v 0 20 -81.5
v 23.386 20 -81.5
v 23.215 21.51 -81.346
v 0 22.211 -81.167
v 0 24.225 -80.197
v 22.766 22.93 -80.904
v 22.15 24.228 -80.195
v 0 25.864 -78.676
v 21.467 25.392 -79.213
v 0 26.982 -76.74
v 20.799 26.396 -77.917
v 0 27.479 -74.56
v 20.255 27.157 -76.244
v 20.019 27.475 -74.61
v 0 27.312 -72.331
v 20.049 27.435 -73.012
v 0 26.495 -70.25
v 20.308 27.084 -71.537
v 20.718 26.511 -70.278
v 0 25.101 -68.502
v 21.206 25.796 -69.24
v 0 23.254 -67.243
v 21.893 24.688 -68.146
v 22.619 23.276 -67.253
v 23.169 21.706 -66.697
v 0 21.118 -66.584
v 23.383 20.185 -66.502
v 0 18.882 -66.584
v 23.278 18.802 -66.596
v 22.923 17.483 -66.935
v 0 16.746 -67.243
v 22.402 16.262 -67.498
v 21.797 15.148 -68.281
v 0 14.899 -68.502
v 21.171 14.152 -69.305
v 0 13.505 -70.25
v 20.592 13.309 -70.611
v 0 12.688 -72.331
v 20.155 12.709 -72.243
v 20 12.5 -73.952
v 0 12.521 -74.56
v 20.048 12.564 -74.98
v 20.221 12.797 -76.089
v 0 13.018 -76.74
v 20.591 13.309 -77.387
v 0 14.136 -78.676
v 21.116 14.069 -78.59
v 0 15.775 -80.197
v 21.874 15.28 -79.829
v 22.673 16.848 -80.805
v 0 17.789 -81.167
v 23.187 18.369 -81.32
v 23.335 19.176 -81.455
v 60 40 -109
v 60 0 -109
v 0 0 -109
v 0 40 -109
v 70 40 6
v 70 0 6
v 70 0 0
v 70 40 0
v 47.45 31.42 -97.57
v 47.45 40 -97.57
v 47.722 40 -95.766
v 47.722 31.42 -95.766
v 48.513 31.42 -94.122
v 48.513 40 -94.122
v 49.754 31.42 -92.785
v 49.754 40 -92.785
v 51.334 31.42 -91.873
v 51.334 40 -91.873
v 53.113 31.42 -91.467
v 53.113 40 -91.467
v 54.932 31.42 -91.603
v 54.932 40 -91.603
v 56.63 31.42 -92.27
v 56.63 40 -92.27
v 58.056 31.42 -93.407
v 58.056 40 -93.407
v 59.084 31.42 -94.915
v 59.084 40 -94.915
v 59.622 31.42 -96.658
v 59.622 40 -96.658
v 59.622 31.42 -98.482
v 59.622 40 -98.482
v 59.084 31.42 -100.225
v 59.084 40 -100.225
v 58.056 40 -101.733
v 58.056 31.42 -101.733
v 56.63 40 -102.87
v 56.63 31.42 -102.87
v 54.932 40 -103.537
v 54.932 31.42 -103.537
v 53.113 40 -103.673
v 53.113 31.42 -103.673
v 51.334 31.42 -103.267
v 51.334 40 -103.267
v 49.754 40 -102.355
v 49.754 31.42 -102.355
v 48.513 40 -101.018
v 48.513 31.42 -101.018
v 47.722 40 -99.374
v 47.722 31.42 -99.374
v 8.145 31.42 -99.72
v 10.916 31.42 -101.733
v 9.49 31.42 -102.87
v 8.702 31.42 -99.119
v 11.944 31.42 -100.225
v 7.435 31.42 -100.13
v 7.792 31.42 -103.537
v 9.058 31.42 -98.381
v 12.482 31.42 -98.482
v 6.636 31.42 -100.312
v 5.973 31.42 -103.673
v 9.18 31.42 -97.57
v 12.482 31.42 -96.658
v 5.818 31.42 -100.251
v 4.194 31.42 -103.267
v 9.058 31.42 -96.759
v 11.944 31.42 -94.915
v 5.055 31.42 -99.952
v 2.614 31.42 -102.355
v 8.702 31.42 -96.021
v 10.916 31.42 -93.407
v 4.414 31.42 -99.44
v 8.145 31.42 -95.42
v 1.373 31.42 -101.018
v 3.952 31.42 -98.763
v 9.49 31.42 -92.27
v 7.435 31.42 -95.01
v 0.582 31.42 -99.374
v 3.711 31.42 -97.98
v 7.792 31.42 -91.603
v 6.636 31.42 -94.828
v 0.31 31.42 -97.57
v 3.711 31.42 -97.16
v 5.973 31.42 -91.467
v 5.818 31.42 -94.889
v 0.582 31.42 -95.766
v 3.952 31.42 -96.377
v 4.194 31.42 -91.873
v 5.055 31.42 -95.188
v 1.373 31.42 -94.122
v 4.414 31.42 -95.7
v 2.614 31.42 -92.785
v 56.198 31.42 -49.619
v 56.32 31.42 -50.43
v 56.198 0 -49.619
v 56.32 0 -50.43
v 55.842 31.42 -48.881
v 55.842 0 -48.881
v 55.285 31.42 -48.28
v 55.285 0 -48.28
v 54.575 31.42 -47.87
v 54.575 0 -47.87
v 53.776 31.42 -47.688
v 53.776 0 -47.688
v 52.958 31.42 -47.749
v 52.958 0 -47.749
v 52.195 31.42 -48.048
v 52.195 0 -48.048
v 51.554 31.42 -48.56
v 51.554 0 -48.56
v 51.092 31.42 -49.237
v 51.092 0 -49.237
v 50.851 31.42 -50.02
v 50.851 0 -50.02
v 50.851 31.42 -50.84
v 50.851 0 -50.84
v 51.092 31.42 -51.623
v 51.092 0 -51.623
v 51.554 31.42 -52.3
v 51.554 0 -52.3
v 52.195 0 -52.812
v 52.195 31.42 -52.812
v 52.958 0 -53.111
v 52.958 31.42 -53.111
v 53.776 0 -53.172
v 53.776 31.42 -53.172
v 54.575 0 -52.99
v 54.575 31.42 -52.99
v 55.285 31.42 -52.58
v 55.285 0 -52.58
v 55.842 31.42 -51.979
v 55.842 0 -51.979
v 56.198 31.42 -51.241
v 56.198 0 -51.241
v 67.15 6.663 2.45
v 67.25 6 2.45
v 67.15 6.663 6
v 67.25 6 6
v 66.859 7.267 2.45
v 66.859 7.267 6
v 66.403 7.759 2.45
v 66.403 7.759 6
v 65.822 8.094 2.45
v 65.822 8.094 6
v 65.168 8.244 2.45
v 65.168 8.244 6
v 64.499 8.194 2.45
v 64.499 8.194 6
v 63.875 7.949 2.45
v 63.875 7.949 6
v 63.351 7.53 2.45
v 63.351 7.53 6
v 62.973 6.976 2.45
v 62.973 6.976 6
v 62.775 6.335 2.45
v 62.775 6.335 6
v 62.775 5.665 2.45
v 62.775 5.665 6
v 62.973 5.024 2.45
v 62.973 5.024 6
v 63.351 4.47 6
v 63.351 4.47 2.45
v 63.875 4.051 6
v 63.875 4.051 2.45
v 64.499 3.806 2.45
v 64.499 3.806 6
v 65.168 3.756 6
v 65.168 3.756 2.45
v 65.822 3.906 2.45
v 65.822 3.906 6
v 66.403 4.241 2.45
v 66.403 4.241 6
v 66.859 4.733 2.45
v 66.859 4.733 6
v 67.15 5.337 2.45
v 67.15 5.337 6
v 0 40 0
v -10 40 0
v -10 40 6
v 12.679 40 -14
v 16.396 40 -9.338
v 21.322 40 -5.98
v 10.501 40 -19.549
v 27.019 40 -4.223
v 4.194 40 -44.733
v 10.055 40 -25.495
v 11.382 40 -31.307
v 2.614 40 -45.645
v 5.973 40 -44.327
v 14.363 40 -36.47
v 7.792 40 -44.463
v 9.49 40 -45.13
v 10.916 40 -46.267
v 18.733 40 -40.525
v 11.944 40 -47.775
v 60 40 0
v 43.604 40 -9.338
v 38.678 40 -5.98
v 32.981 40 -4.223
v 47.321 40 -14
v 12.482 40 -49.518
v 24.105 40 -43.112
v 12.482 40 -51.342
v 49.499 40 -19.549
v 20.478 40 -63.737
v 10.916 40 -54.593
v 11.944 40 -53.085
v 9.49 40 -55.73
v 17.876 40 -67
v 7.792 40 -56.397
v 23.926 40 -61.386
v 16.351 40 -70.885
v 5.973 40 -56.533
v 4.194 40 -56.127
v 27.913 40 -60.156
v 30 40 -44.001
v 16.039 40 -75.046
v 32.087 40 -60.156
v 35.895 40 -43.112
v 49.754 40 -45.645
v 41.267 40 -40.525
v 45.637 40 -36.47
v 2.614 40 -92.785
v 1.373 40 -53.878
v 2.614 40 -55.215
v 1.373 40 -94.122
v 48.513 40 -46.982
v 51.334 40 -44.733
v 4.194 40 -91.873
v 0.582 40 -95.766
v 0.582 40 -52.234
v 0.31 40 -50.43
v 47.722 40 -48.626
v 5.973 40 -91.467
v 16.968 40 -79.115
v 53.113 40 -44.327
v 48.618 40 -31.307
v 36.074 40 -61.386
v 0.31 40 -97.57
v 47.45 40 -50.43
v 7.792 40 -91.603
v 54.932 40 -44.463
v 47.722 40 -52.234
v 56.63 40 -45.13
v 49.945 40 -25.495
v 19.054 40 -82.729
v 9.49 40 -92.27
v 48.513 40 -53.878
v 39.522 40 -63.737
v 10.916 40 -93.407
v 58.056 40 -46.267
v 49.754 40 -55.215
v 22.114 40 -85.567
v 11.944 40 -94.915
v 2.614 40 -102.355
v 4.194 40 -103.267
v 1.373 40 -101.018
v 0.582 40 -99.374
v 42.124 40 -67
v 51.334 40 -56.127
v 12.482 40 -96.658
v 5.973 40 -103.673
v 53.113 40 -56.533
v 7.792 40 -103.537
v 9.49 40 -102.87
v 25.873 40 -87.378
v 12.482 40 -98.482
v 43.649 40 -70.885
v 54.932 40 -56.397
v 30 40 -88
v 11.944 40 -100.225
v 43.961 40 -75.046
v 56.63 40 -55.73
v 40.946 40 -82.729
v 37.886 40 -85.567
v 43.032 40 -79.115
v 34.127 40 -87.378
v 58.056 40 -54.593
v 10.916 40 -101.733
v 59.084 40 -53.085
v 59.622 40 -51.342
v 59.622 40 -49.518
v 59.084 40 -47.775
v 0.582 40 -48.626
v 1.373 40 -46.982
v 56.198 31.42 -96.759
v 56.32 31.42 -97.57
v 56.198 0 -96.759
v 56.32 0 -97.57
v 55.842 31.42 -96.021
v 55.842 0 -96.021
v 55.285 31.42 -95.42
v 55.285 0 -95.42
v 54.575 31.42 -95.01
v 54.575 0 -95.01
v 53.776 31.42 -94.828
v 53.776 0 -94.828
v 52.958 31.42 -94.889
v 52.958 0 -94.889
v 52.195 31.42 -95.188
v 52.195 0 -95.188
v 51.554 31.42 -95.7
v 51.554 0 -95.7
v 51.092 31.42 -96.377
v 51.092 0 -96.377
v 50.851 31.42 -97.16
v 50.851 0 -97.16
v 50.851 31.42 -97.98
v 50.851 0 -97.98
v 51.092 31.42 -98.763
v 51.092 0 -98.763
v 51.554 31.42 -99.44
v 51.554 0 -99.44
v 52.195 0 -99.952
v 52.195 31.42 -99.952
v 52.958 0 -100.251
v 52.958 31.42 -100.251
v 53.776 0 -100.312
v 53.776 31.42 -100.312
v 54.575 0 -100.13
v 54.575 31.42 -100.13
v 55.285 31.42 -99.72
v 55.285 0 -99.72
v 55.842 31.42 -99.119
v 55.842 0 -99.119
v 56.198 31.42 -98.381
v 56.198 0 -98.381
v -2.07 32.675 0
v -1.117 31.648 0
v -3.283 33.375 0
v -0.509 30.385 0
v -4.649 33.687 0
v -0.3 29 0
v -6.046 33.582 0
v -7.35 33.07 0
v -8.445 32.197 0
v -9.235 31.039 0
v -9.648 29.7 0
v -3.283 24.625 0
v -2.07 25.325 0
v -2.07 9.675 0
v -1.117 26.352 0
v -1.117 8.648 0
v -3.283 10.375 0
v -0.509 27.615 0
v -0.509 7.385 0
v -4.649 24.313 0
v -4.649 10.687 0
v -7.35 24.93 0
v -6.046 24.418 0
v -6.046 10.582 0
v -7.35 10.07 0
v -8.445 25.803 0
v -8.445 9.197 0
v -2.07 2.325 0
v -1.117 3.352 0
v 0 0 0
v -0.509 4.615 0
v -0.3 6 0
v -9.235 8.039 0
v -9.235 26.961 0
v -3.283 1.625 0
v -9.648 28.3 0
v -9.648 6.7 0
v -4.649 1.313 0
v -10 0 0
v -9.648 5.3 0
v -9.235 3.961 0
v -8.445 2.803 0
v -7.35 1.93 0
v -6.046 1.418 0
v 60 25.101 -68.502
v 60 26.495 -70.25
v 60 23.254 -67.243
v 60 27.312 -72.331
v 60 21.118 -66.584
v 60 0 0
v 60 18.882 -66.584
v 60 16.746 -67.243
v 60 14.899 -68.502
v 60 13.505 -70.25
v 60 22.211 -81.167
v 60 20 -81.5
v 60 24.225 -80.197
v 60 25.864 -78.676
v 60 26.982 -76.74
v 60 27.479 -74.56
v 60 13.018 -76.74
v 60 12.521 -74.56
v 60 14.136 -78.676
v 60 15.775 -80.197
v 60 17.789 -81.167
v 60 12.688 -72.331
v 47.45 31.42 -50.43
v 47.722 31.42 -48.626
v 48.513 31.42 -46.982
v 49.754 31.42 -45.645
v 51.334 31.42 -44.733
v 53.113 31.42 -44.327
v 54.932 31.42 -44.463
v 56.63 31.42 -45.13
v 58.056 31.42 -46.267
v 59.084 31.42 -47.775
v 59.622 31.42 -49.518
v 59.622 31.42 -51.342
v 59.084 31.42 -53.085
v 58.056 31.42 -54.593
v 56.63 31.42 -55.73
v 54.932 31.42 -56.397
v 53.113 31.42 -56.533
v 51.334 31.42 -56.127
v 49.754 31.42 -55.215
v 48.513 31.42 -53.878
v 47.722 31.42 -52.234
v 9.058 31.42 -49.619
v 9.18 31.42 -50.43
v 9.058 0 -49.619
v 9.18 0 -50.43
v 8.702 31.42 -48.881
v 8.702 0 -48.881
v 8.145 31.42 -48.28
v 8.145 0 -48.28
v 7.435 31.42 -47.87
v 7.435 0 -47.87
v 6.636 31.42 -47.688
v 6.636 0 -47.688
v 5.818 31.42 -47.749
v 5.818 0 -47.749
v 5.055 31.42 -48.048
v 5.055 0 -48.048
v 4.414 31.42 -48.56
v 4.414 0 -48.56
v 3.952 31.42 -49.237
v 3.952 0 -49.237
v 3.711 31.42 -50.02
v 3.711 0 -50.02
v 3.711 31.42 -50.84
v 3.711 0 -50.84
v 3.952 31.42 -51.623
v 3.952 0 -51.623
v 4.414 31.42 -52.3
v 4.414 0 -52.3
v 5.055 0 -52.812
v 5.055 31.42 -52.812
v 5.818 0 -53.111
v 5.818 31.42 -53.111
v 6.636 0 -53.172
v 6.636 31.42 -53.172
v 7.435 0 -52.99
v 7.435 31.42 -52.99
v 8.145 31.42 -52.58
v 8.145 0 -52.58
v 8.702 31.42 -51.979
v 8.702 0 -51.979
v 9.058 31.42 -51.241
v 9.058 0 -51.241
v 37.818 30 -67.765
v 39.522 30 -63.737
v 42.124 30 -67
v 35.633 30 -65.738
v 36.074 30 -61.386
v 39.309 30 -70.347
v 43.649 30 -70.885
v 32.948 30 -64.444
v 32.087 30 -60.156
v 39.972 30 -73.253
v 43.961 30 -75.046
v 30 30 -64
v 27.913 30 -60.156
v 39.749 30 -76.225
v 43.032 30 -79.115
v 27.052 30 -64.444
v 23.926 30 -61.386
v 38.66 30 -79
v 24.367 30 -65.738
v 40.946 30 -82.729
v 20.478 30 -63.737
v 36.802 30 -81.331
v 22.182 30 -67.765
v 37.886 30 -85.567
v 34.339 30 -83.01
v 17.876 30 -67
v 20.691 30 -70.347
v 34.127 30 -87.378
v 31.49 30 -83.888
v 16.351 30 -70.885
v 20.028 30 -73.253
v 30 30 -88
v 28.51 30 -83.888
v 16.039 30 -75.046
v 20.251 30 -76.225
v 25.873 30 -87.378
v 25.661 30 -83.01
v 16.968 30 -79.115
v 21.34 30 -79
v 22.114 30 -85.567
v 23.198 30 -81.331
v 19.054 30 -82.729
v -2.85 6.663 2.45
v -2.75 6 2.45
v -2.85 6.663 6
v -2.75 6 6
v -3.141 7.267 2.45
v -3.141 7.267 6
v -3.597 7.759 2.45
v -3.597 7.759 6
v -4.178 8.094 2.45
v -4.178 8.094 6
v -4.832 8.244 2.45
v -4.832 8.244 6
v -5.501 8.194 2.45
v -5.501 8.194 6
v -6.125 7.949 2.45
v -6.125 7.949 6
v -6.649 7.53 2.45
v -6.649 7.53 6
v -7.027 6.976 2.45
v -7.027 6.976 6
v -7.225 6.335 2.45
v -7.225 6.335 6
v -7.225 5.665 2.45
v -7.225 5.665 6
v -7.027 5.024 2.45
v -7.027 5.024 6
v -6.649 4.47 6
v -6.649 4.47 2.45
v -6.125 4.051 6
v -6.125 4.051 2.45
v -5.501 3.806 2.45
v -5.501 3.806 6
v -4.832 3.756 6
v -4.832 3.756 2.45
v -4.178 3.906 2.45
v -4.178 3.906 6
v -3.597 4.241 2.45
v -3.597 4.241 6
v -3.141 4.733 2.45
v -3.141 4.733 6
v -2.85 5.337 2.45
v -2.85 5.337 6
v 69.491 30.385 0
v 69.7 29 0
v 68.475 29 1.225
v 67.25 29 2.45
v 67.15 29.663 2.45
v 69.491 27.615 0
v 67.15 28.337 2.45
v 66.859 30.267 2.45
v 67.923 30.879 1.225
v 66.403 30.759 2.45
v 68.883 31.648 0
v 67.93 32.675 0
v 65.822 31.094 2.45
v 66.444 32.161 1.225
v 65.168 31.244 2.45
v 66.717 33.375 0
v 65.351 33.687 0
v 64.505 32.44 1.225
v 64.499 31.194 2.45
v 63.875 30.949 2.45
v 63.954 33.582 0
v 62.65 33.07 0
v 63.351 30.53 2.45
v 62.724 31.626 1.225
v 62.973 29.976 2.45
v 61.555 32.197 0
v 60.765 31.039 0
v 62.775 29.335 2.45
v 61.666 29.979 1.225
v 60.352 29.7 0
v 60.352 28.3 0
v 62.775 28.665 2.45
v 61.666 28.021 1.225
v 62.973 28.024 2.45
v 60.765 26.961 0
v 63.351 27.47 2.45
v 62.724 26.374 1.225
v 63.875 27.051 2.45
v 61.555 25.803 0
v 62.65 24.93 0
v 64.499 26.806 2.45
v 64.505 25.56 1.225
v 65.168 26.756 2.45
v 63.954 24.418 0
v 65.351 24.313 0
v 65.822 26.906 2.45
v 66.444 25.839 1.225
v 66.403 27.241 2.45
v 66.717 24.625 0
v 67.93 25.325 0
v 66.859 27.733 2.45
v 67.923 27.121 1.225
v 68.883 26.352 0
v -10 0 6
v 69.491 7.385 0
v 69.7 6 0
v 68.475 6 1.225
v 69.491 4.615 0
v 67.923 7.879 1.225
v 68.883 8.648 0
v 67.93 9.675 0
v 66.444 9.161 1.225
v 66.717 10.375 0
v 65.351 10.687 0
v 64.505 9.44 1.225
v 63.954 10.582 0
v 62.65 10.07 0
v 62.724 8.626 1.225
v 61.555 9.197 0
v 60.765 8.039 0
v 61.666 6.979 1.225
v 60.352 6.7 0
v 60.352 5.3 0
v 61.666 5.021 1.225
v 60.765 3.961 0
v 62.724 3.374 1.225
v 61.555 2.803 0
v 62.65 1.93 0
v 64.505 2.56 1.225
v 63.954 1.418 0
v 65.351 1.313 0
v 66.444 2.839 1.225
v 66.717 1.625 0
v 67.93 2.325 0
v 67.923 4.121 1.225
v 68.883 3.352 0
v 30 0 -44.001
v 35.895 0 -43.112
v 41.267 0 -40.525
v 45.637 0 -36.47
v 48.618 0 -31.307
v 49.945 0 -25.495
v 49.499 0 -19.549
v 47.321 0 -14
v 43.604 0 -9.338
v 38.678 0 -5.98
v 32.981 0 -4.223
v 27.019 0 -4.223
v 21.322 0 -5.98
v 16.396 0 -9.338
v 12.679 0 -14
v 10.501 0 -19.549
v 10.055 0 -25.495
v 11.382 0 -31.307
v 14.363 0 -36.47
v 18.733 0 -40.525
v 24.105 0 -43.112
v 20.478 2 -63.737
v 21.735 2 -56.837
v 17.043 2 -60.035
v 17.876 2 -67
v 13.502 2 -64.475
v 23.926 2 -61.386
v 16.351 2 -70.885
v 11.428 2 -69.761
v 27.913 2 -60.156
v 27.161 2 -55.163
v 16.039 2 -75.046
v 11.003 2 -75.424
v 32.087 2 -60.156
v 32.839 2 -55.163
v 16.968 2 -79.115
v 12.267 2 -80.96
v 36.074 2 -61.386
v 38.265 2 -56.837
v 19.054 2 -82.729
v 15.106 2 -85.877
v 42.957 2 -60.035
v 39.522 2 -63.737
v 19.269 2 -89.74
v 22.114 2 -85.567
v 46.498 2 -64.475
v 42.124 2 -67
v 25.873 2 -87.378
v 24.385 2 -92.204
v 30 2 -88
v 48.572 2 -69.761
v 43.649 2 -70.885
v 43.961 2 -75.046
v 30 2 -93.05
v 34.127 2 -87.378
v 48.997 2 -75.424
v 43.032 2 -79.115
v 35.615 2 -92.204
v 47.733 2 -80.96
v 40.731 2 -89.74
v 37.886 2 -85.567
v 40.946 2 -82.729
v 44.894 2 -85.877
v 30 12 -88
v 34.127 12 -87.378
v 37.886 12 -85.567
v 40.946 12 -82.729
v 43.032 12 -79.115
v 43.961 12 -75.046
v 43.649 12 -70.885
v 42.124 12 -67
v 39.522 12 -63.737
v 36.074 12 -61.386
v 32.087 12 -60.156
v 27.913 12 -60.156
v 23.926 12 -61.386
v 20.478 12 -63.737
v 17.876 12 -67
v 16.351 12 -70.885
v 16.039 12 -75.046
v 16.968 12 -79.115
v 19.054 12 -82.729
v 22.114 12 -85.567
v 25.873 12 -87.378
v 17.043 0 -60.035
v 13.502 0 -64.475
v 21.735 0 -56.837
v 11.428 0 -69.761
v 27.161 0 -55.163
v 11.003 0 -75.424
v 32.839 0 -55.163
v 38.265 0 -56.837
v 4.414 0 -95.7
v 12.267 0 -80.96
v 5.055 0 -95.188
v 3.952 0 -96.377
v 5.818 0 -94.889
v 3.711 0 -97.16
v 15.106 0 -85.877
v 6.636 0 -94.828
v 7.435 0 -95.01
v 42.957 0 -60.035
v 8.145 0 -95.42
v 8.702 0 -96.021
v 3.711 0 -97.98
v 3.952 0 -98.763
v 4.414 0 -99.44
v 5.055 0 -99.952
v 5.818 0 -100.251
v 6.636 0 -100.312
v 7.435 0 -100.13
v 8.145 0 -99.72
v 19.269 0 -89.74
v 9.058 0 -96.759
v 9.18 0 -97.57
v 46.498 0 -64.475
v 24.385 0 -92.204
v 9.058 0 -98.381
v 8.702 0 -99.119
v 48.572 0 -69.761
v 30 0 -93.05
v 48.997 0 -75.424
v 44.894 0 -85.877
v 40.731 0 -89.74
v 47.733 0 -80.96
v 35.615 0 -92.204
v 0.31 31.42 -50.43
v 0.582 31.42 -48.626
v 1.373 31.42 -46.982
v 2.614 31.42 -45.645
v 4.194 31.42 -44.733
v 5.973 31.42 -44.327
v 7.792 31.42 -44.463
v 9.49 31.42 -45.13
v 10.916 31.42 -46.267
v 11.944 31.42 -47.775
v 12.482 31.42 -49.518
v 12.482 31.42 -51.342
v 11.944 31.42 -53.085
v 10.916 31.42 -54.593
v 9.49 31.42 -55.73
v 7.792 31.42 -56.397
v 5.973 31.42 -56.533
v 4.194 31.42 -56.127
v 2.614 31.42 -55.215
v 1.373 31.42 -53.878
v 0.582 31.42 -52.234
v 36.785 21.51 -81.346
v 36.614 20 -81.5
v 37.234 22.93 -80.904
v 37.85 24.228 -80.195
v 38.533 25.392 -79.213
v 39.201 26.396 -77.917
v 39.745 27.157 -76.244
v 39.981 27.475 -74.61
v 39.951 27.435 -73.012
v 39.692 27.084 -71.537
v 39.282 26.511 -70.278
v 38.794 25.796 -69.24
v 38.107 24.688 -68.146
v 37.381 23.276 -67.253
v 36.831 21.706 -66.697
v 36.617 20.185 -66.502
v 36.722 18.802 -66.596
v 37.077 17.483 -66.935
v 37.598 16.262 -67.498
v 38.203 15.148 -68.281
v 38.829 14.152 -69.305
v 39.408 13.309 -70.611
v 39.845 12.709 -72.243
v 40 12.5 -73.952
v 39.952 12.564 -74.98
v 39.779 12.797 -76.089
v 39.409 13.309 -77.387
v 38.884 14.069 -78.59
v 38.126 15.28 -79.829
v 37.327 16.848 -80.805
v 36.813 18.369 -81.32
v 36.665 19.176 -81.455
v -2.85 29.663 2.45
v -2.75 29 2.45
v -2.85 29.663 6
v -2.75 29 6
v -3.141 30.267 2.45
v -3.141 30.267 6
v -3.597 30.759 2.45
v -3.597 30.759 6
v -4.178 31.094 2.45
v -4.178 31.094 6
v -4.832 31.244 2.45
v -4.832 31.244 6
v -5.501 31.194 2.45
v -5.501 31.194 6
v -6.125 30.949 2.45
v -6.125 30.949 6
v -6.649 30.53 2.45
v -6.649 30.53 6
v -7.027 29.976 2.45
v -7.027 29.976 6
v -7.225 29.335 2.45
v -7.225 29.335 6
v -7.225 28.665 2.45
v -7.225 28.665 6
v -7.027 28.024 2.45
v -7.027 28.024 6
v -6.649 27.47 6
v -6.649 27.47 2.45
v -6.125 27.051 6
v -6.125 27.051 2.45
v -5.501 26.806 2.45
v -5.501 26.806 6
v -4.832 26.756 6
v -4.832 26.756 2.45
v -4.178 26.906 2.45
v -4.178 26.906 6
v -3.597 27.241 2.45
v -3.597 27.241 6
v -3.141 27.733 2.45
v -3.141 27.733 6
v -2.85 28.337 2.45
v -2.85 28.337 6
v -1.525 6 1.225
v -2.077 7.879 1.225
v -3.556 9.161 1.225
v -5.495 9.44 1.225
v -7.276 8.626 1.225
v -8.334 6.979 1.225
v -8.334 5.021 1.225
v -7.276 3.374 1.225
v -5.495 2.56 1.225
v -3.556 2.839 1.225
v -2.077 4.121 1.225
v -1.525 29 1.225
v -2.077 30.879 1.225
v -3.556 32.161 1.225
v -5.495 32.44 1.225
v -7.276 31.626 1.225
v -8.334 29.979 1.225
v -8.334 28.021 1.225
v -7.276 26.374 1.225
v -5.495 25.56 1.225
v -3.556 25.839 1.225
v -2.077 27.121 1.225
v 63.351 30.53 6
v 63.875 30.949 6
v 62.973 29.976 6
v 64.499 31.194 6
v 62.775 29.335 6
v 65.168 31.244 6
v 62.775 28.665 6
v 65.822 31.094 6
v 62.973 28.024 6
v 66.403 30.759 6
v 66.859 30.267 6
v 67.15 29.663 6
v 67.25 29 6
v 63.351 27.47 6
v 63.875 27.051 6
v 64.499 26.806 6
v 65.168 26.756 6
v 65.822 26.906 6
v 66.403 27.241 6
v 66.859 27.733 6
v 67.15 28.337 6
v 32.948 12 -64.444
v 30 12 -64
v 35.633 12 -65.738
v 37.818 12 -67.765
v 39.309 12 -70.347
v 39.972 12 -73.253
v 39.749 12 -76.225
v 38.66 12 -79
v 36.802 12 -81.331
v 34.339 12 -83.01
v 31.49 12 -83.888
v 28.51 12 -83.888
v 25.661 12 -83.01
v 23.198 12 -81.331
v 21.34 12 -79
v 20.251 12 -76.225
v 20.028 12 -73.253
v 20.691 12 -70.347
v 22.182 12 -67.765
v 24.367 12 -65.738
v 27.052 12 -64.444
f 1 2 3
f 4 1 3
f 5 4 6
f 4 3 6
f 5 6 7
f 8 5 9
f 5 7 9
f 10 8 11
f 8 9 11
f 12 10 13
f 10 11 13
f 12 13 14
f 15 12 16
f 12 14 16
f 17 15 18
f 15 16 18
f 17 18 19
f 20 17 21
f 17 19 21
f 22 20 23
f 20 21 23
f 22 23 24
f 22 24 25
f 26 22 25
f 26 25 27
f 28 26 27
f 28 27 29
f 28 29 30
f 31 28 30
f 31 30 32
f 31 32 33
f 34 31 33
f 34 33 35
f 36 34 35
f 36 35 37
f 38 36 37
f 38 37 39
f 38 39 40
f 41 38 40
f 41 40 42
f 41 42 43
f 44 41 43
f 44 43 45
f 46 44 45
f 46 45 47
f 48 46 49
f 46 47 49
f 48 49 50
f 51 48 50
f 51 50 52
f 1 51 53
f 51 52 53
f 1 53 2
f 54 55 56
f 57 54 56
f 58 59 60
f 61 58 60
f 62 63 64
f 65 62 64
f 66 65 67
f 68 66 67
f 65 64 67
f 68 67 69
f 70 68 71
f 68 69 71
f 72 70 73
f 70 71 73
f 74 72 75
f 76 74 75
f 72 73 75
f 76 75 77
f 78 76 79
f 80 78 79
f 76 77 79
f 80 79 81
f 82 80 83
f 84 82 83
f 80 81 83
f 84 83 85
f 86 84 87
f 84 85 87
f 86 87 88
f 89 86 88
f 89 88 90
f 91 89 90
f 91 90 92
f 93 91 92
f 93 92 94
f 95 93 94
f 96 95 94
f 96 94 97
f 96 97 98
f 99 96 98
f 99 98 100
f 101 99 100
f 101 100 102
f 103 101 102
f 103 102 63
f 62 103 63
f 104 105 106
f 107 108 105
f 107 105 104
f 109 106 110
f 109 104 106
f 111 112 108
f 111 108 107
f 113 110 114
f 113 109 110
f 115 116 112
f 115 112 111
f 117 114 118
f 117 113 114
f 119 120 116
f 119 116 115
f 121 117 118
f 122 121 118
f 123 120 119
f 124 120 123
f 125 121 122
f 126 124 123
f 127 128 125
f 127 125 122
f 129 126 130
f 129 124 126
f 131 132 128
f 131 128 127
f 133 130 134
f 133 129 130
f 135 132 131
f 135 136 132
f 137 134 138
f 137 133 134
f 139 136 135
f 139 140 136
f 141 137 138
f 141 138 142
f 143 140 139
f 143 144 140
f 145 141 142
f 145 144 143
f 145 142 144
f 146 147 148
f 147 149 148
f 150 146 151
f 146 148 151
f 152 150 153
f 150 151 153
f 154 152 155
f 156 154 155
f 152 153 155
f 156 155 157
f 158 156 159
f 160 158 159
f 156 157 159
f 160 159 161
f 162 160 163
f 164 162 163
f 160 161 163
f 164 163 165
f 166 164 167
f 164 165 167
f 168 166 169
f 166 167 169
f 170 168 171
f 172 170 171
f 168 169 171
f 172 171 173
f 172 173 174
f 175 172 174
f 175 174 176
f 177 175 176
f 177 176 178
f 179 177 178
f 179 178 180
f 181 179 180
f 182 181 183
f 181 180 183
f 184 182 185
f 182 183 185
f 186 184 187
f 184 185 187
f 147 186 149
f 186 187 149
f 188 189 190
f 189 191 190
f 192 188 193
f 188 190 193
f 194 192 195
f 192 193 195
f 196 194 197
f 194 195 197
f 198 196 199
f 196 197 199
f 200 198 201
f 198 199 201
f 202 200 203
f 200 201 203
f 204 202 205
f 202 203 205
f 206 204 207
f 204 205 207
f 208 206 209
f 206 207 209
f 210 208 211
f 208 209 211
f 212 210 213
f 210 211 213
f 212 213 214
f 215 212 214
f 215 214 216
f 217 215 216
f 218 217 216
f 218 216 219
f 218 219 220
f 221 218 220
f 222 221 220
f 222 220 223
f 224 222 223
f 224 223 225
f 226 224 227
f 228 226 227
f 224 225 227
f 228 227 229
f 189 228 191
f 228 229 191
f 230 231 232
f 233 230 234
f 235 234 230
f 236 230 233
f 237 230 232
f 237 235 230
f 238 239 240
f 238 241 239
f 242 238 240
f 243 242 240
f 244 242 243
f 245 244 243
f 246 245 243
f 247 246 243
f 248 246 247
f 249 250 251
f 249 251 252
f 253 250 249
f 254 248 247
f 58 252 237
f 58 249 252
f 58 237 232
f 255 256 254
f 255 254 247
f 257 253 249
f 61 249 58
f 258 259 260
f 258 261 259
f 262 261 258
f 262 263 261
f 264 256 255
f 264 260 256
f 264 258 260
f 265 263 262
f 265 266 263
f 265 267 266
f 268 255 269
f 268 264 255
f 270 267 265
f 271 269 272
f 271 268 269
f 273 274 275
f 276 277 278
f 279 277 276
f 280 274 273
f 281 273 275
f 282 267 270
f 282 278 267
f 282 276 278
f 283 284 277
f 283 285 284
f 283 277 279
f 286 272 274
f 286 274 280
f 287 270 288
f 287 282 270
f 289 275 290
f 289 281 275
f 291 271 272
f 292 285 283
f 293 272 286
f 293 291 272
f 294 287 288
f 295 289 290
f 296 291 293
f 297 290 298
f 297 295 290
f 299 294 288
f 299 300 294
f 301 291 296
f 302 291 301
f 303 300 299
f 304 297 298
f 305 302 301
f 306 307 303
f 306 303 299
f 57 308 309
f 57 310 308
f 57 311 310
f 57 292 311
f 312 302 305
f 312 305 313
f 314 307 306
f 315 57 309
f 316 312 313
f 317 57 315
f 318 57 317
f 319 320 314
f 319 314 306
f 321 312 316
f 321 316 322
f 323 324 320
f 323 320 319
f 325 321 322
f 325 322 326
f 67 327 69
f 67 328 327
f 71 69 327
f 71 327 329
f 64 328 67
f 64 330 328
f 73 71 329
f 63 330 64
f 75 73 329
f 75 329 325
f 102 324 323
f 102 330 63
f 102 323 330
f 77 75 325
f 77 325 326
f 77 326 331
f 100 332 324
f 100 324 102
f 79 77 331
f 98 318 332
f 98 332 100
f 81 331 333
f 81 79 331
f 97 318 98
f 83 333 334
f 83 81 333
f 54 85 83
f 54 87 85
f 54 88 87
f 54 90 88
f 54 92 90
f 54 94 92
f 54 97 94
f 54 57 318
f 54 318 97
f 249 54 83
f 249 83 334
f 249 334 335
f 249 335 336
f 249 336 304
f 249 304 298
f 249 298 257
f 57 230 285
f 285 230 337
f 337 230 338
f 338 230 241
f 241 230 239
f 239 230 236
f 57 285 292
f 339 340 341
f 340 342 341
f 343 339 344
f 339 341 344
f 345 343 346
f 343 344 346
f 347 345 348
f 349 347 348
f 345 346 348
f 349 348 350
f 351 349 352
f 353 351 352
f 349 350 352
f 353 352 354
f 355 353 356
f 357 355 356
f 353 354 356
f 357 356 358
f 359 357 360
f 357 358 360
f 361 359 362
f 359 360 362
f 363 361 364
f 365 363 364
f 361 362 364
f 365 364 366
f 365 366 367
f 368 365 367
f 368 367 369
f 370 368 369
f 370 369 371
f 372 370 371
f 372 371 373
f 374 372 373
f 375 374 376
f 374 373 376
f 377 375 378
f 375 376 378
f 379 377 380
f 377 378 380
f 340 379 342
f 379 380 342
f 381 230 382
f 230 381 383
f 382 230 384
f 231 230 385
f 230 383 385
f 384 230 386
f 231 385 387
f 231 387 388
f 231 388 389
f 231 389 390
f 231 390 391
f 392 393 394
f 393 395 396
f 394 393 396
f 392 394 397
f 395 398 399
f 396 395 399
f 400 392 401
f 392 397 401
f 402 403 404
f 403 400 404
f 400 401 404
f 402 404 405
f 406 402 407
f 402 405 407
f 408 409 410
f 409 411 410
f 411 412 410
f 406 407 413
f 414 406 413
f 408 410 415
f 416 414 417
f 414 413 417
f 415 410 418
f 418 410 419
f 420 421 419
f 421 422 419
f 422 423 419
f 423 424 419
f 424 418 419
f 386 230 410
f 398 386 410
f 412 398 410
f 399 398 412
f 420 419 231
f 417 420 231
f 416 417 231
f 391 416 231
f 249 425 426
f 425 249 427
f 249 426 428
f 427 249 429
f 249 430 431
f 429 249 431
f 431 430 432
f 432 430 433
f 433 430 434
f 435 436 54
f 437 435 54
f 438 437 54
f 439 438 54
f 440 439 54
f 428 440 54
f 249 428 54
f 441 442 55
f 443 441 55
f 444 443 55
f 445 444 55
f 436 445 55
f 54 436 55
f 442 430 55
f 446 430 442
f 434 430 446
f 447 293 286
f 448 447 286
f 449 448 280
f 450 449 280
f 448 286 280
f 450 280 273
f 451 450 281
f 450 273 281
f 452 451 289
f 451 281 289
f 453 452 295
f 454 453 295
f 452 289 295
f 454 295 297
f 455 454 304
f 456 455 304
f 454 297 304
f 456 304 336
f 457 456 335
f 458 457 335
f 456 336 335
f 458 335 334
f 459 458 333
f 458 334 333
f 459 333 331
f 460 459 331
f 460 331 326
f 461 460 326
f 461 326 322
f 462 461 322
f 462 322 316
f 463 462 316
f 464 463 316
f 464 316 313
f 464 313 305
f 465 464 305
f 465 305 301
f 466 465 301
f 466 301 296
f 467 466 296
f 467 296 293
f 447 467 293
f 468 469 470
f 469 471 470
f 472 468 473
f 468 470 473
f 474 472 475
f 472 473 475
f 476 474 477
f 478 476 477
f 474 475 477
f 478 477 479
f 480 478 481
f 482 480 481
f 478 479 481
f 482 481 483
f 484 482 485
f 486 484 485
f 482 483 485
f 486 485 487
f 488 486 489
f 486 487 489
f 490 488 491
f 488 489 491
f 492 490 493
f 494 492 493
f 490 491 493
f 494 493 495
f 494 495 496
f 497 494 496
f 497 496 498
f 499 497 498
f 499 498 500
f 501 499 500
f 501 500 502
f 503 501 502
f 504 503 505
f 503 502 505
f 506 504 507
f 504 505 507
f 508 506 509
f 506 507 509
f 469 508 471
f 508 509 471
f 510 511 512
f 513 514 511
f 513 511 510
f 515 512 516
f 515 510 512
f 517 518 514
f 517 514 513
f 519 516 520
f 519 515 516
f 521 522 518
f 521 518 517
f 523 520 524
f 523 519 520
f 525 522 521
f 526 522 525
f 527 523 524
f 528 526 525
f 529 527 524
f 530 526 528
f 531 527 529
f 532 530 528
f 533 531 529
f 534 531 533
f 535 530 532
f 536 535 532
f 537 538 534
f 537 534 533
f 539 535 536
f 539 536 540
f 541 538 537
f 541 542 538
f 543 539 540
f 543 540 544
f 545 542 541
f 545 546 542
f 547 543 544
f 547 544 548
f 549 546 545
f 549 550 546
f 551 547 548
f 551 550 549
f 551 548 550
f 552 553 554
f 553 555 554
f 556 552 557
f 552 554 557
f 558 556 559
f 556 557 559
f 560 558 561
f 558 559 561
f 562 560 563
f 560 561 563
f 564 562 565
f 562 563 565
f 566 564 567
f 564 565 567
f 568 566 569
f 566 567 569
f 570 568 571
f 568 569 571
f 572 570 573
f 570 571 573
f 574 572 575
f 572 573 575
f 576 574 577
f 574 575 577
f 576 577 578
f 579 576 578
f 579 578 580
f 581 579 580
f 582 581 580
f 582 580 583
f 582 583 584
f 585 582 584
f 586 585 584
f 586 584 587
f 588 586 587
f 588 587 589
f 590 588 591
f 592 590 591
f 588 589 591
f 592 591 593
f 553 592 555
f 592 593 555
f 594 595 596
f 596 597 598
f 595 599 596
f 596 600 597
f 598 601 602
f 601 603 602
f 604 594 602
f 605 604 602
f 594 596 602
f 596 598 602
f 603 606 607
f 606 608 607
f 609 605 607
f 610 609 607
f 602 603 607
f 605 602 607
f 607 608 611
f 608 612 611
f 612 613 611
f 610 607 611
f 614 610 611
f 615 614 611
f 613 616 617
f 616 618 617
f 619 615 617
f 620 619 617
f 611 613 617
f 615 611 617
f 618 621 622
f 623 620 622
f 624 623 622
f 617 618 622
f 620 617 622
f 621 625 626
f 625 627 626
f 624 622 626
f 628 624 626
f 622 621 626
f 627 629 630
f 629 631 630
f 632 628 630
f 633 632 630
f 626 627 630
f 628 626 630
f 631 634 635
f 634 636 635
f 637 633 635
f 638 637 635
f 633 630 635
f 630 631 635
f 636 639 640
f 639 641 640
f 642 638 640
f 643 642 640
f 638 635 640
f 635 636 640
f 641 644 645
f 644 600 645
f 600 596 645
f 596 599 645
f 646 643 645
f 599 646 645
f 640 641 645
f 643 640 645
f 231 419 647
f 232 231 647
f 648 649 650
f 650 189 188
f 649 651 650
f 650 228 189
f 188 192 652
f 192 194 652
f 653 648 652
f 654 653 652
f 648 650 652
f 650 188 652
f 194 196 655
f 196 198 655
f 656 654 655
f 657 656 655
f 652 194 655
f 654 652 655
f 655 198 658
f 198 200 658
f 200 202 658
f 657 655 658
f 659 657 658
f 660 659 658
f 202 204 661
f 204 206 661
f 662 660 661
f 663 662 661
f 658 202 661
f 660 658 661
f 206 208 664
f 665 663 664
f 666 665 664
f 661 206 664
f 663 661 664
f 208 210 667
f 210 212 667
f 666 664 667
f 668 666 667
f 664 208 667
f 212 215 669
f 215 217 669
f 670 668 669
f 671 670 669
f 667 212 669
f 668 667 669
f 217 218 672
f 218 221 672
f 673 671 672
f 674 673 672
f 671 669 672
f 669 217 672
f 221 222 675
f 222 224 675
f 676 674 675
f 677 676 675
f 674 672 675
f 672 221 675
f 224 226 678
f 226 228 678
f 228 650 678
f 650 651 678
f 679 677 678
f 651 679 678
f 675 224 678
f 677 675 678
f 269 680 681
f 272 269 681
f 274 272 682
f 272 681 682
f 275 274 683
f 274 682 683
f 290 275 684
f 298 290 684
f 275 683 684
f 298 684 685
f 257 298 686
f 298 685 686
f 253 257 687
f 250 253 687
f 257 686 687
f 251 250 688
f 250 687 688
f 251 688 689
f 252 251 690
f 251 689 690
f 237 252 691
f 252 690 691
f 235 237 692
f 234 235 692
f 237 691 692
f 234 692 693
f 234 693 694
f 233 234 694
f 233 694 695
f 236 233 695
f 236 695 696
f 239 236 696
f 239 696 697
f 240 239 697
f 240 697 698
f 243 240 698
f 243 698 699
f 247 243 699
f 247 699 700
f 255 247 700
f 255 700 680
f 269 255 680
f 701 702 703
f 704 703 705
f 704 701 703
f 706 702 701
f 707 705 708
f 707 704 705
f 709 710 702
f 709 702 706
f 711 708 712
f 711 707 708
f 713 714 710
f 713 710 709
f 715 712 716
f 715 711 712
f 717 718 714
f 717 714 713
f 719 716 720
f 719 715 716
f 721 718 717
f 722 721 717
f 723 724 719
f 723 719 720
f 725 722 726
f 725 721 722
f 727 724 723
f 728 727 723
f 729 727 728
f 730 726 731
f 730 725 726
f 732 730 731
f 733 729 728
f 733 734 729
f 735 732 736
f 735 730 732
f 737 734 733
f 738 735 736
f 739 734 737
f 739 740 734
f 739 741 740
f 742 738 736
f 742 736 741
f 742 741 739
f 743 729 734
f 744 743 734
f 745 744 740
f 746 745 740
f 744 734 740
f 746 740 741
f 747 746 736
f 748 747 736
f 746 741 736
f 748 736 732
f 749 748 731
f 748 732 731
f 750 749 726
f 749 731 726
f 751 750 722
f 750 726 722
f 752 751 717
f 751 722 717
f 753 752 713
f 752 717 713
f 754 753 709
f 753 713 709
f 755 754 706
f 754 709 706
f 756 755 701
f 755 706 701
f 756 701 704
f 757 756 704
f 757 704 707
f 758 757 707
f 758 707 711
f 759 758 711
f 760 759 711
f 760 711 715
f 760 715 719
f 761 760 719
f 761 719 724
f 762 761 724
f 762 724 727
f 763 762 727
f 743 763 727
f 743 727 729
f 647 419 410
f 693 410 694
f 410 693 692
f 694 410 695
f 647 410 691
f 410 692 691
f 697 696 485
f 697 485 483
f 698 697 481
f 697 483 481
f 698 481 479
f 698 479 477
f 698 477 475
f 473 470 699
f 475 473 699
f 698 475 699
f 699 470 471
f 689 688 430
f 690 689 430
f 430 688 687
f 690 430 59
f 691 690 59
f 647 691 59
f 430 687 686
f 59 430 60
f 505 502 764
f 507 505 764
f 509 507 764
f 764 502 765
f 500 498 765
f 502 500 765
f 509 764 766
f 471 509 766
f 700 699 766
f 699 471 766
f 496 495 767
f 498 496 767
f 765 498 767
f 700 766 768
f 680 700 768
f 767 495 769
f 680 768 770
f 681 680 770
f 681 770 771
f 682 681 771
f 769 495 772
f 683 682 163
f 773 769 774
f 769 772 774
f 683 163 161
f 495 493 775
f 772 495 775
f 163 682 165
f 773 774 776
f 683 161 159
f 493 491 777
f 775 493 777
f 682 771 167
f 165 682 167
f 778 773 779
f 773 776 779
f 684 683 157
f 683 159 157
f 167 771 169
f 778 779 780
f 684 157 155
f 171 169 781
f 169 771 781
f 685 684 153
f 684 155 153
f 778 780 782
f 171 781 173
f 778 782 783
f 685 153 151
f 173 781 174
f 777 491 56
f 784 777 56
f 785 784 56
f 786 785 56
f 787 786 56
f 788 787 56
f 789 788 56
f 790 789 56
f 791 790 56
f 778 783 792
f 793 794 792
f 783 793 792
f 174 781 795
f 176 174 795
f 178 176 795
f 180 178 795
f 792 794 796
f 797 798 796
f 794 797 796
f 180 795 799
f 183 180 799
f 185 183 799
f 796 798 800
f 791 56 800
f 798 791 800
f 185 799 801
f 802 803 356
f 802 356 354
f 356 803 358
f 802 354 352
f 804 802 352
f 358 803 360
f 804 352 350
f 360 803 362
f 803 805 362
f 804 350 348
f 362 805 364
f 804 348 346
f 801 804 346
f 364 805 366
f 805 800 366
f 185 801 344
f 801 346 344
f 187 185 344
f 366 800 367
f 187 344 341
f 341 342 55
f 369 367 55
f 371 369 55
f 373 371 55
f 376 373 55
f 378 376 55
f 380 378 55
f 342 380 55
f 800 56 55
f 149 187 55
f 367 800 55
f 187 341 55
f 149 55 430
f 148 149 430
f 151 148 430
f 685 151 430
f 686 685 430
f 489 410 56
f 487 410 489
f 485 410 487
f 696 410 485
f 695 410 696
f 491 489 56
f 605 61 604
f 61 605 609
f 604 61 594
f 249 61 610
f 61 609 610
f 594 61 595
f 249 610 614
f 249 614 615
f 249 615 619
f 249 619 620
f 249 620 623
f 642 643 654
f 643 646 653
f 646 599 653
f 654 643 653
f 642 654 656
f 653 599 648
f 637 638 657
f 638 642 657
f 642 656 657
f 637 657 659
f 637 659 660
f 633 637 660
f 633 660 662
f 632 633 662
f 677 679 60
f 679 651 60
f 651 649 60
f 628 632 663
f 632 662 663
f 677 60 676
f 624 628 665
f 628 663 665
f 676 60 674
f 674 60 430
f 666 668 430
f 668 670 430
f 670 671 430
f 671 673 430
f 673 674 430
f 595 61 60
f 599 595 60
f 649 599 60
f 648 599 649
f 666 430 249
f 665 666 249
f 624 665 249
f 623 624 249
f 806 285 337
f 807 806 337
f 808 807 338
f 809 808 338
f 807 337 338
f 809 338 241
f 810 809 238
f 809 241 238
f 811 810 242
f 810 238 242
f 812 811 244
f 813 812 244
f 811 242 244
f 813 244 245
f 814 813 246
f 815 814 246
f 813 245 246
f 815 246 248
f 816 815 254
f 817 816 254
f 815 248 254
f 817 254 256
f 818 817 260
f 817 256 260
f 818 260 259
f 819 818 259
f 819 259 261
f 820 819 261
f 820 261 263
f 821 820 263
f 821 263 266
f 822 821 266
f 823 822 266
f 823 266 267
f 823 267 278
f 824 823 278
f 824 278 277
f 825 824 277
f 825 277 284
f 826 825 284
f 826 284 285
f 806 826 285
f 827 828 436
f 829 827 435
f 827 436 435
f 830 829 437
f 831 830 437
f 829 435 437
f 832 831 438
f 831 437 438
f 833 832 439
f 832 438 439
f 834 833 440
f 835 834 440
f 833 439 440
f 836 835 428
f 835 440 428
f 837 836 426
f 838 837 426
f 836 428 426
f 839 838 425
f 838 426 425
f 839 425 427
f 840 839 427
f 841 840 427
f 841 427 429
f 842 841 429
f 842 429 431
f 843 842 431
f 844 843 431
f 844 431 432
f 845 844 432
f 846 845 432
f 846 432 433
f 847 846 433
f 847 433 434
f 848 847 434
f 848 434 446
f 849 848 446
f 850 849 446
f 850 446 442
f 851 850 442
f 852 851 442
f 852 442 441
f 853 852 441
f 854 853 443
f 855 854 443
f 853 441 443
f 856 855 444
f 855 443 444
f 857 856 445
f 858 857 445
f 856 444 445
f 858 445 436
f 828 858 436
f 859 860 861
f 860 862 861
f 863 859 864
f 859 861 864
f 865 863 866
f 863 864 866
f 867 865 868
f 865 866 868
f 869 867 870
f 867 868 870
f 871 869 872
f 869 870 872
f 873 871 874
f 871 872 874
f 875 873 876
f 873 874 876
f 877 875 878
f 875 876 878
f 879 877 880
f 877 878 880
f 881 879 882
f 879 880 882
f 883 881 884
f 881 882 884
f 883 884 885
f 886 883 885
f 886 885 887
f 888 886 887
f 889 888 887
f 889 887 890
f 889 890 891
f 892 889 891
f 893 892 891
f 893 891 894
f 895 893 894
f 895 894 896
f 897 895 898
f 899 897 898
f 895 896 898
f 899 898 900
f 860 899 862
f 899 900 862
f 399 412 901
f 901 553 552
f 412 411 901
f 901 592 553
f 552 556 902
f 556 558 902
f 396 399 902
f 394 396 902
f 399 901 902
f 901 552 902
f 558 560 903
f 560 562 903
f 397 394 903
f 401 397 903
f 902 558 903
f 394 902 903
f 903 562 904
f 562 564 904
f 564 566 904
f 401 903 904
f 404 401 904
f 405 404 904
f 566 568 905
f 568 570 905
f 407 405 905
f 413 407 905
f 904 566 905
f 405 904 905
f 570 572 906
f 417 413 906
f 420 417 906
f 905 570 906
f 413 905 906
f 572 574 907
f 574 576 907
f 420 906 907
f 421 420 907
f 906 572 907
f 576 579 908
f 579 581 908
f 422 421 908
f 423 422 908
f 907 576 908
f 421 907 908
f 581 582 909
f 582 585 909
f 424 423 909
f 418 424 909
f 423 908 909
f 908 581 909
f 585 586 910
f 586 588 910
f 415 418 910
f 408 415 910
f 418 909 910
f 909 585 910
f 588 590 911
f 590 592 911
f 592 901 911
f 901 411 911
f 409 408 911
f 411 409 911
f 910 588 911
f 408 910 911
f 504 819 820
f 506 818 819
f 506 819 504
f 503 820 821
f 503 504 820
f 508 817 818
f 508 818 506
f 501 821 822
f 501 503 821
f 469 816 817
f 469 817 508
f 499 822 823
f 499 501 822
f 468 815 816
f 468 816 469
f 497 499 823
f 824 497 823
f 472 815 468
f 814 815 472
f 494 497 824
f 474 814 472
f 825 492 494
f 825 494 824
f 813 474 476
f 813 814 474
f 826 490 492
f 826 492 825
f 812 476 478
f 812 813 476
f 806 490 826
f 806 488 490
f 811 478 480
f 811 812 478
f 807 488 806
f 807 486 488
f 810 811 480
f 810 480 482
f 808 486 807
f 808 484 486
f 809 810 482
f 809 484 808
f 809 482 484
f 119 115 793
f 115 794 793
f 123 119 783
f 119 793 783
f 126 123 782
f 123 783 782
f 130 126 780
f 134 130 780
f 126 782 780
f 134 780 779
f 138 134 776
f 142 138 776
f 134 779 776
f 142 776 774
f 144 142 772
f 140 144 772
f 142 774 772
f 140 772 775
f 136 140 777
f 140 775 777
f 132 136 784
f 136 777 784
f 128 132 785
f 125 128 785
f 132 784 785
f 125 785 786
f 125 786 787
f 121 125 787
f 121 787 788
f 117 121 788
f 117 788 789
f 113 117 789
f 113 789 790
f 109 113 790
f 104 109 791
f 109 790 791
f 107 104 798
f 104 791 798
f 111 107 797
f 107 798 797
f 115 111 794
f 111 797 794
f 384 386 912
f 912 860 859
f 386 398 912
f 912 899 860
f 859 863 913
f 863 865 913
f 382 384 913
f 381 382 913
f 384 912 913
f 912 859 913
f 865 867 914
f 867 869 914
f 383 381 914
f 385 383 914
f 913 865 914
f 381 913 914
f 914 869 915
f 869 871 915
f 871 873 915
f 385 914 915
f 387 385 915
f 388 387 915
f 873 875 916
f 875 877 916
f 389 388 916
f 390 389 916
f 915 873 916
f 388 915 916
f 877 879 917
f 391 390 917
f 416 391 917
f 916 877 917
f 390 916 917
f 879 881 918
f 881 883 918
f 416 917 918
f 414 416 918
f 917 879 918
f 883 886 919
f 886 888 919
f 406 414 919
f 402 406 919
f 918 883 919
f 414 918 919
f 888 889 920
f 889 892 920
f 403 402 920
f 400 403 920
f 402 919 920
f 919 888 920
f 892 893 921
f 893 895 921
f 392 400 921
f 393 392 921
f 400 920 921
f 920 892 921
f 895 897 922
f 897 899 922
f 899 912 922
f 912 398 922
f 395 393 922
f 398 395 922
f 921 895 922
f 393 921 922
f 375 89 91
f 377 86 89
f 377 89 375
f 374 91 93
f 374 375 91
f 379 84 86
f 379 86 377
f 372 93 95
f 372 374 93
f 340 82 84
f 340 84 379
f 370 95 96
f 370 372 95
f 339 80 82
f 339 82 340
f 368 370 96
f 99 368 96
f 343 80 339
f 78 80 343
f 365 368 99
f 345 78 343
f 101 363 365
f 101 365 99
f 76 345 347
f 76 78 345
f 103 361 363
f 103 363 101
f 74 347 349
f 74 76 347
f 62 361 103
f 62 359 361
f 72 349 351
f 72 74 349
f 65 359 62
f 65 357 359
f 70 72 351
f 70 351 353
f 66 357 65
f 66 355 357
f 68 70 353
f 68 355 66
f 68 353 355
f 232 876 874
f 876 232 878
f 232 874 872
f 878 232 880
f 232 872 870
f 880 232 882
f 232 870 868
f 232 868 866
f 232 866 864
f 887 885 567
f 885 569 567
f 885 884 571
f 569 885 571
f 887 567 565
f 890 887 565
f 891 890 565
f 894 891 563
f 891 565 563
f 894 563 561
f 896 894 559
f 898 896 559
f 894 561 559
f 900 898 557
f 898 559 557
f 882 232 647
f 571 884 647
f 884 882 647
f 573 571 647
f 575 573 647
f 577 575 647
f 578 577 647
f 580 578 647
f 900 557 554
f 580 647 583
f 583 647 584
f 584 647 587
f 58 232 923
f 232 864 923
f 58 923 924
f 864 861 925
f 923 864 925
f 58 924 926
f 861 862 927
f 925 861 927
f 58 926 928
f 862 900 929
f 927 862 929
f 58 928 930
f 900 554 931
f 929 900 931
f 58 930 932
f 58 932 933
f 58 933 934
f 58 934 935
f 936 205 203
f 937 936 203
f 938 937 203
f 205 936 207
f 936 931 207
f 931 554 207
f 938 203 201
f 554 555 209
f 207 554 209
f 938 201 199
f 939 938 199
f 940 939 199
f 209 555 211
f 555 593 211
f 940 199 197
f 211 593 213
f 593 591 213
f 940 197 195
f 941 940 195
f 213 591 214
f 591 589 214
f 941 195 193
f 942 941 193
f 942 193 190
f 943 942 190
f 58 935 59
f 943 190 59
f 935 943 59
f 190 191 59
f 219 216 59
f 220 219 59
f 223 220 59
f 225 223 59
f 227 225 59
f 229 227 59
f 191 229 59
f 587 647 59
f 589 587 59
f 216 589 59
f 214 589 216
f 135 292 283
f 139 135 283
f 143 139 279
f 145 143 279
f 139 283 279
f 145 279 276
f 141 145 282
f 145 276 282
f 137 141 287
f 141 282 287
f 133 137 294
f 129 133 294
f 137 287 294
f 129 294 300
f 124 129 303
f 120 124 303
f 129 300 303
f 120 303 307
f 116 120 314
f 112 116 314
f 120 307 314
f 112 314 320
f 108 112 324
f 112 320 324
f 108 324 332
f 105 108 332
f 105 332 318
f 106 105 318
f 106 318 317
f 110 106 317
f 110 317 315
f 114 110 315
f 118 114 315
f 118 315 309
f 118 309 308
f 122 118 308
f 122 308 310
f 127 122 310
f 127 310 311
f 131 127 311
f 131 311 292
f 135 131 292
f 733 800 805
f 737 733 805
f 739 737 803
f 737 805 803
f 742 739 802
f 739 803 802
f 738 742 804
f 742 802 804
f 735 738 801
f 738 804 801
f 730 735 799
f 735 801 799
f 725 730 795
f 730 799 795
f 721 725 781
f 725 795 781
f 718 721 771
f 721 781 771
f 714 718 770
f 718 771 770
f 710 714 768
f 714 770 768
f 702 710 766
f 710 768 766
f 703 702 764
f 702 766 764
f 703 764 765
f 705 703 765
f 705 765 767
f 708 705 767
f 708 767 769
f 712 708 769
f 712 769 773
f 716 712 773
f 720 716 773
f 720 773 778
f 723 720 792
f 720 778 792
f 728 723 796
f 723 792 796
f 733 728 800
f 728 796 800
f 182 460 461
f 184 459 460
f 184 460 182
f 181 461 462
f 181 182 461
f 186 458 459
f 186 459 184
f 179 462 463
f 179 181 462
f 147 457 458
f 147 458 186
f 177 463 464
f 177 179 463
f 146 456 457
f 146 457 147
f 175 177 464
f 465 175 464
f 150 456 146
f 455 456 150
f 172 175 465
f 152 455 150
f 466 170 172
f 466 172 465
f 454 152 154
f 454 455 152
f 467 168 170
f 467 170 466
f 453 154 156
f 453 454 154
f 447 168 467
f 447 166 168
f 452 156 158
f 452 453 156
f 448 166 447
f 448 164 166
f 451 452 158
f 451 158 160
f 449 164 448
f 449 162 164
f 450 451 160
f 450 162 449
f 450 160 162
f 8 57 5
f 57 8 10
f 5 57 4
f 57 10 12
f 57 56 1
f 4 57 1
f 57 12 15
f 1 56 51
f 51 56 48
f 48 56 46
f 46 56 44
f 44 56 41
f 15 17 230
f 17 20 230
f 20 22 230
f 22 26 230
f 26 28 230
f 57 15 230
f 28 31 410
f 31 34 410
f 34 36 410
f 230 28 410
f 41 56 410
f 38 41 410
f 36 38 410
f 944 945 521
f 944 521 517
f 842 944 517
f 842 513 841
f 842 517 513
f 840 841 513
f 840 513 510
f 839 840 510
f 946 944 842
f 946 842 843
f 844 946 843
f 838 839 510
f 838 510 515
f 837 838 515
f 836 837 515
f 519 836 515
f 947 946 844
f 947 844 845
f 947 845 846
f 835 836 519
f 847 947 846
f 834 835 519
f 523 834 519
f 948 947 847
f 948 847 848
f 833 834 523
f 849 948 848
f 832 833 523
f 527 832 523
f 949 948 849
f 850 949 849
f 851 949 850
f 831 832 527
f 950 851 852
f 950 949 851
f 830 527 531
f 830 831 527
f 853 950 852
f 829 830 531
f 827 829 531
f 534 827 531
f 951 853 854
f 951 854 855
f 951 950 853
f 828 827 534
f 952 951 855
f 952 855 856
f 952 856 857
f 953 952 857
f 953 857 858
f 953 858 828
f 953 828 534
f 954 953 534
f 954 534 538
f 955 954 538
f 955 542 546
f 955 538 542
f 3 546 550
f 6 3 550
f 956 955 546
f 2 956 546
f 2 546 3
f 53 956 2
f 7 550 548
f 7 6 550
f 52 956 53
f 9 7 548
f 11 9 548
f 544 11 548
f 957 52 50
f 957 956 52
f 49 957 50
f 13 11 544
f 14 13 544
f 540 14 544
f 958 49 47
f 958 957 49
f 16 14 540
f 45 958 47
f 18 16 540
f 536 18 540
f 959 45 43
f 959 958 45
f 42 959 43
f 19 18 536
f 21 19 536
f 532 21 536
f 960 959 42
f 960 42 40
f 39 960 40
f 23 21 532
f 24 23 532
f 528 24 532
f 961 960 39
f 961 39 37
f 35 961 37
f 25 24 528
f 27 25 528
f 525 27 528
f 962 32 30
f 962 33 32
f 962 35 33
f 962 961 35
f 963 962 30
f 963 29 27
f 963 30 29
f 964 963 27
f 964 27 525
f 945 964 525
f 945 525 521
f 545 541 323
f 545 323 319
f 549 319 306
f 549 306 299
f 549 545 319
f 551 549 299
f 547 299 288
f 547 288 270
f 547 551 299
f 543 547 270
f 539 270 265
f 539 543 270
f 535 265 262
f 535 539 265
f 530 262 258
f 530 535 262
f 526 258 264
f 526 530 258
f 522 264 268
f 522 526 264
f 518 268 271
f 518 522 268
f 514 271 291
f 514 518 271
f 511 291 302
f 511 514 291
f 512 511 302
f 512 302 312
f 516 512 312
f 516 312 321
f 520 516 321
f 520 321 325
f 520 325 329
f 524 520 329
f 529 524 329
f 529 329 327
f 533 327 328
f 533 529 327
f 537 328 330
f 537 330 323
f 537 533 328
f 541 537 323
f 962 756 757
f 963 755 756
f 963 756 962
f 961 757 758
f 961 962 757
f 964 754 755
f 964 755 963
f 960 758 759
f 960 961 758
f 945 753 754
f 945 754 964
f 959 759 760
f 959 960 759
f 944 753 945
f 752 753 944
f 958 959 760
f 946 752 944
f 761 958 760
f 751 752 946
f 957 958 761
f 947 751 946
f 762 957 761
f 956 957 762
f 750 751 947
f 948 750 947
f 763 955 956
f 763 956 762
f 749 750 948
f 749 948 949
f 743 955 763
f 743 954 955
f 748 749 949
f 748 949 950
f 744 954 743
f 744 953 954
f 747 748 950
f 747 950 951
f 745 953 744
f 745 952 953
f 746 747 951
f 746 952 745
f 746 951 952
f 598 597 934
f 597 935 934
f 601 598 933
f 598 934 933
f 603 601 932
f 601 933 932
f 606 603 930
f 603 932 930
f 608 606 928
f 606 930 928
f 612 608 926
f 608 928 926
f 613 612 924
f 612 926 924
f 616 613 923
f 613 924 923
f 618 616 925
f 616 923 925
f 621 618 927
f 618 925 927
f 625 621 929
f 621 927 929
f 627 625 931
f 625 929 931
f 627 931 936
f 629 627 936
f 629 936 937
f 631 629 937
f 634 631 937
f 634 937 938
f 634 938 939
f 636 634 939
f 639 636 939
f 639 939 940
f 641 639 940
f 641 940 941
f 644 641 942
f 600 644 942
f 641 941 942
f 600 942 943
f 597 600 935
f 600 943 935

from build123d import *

# Parameters (mm, degrees)
SKETCH1_R                                       = 10
BOSS_EXTRUDE1_DEPTH                             = 40
SKETCH2_R                                       = 14
CUT_EXTRUDE1_DEPTH                              = 12
CUT_EXTRUDE2_START                              = -10
SKETCH3_R                                       = 14
CUT_EXTRUDE2_DEPTH                              = 10
SKETCH5_R                                       = 19.05
CUT_EXTRUDE3_DEPTH                              = 2
CBORE_FOR_M5_HEX_HEAD_BOLT1_D                   = 5.5
CBORE_FOR_M5_HEX_HEAD_BOLT1_CBORE_D             = 12.24
CBORE_FOR_M5_HEX_HEAD_BOLT1_CBORE_DEPTH         = 8.58
CSK_FOR_M4_FLAT_HEAD_MACHINE_SCREW1_D           = 4.5
CSK_FOR_M4_FLAT_HEAD_MACHINE_SCREW1_CSINK_D     = 9.4
CSK_FOR_M4_FLAT_HEAD_MACHINE_SCREW1_CSINK_ANGLE = 90
LPATTERN1_COUNT                                 = 2
LPATTERN1_PITCH                                 = 23
LPATTERN1_COUNT_DIR2                            = 2
LPATTERN1_PITCH_DIR2                            = 70
SKETCH13_R                                      = 7.5
CUT_EXTRUDE4_DEPTH                              = 136.576546644
SKETCH14_R                                      = 20.000672508
CUT_EXTRUDE5_DEPTH                              = 136.576546644


with BuildPart() as part:
    # Sketch1 → Boss-Extrude1 (new body)
    with BuildSketch(Plane(origin=(0, 0, 0), x_dir=(1, 0, 0), z_dir=(0, 1, 0))):
        Polygon((0, 0), (-10, 0), (-10, -6), (70, -6), (70, 0), (60, 0), (60, 109), (0, 109), align=None)
        with Locations(Location((30, 74, 0), (0, 0, 270))):
            Circle(SKETCH1_R, mode=Mode.SUBTRACT)
    extrude(amount=BOSS_EXTRUDE1_DEPTH)

    # Sketch2 → Cut-Extrude1 (cut)
    with BuildSketch(Plane.XZ):
        with Locations(Location((30, -74, 0), (0, 0, 270))):
            Circle(SKETCH2_R)
    extrude(amount=-CUT_EXTRUDE1_DEPTH, mode=Mode.SUBTRACT)

    # Sketch3 → Cut-Extrude2 (cut)
    with BuildSketch(Plane(origin=(0, 40, 0), x_dir=(1, 0, 0), z_dir=(0, 1, 0)).offset(CUT_EXTRUDE2_START)):
        with Locations(Location((30, 74, 0), (0, 0, 90))):
            Circle(SKETCH3_R)
    extrude(amount=CUT_EXTRUDE2_DEPTH, mode=Mode.SUBTRACT)

    # Sketch5 → Cut-Extrude3 (cut)
    with BuildSketch(Plane.XZ):
        with Locations(Location((30, -74, 0), (0, 0, 270))):
            Circle(SKETCH5_R)
    extrude(amount=-CUT_EXTRUDE3_DEPTH, mode=Mode.SUBTRACT)

    # CBORE for M5 Hex Head Bolt1 (through all)
    with Locations(Plane(origin=(0, 40, 0), x_dir=(-1, 0, 0), z_dir=(0, 1, 0))):
        with Locations((-6.43, -97.57), (-6.43, -50.43), (-53.57, -50.43), (-53.57, -97.57)):
            CounterBoreHole(CBORE_FOR_M5_HEX_HEAD_BOLT1_D / 2, CBORE_FOR_M5_HEX_HEAD_BOLT1_CBORE_D / 2, CBORE_FOR_M5_HEX_HEAD_BOLT1_CBORE_DEPTH)

    # CSK for M4 Flat Head Machine Screw1 (through all)
    with Locations(Plane(origin=(0, 0, 0), x_dir=(-1, 0, 0), z_dir=(0, 0, -1))):
        with Locations((-65, 6)):
            csk_for_m4_flat_head_machine_screw1 = CounterSinkHole(CSK_FOR_M4_FLAT_HEAD_MACHINE_SCREW1_D / 2, CSK_FOR_M4_FLAT_HEAD_MACHINE_SCREW1_CSINK_D / 2, counter_sink_angle=CSK_FOR_M4_FLAT_HEAD_MACHINE_SCREW1_CSINK_ANGLE)

    # LPattern1: CSK for M4 Flat Head Machine Screw1 2 × 2
    with Locations(*[(-j * LPATTERN1_PITCH_DIR2, i * LPATTERN1_PITCH, 0) for i in range(LPATTERN1_COUNT) for j in range(LPATTERN1_COUNT_DIR2) if (i, j) != (0, 0)]):
        add(csk_for_m4_flat_head_machine_screw1, mode=Mode.SUBTRACT)

    # Sketch13 → Cut-Extrude4 (cut, through all)
    with BuildSketch(Plane(origin=(60, 0, 0), x_dir=(0, 0, -1), z_dir=(1, 0, 0))):
        with Locations((74, 20)):
            Circle(SKETCH13_R)
    extrude(amount=-CUT_EXTRUDE4_DEPTH, mode=Mode.SUBTRACT)

    # Sketch14 → Cut-Extrude5 (cut, through all)
    with BuildSketch(Plane.XZ):
        with Locations(Location((30, -24, 0), (0, 0, 270))):
            Circle(SKETCH14_R)
    extrude(amount=-CUT_EXTRUDE5_DEPTH, mode=Mode.SUBTRACT)


solid = part.part
